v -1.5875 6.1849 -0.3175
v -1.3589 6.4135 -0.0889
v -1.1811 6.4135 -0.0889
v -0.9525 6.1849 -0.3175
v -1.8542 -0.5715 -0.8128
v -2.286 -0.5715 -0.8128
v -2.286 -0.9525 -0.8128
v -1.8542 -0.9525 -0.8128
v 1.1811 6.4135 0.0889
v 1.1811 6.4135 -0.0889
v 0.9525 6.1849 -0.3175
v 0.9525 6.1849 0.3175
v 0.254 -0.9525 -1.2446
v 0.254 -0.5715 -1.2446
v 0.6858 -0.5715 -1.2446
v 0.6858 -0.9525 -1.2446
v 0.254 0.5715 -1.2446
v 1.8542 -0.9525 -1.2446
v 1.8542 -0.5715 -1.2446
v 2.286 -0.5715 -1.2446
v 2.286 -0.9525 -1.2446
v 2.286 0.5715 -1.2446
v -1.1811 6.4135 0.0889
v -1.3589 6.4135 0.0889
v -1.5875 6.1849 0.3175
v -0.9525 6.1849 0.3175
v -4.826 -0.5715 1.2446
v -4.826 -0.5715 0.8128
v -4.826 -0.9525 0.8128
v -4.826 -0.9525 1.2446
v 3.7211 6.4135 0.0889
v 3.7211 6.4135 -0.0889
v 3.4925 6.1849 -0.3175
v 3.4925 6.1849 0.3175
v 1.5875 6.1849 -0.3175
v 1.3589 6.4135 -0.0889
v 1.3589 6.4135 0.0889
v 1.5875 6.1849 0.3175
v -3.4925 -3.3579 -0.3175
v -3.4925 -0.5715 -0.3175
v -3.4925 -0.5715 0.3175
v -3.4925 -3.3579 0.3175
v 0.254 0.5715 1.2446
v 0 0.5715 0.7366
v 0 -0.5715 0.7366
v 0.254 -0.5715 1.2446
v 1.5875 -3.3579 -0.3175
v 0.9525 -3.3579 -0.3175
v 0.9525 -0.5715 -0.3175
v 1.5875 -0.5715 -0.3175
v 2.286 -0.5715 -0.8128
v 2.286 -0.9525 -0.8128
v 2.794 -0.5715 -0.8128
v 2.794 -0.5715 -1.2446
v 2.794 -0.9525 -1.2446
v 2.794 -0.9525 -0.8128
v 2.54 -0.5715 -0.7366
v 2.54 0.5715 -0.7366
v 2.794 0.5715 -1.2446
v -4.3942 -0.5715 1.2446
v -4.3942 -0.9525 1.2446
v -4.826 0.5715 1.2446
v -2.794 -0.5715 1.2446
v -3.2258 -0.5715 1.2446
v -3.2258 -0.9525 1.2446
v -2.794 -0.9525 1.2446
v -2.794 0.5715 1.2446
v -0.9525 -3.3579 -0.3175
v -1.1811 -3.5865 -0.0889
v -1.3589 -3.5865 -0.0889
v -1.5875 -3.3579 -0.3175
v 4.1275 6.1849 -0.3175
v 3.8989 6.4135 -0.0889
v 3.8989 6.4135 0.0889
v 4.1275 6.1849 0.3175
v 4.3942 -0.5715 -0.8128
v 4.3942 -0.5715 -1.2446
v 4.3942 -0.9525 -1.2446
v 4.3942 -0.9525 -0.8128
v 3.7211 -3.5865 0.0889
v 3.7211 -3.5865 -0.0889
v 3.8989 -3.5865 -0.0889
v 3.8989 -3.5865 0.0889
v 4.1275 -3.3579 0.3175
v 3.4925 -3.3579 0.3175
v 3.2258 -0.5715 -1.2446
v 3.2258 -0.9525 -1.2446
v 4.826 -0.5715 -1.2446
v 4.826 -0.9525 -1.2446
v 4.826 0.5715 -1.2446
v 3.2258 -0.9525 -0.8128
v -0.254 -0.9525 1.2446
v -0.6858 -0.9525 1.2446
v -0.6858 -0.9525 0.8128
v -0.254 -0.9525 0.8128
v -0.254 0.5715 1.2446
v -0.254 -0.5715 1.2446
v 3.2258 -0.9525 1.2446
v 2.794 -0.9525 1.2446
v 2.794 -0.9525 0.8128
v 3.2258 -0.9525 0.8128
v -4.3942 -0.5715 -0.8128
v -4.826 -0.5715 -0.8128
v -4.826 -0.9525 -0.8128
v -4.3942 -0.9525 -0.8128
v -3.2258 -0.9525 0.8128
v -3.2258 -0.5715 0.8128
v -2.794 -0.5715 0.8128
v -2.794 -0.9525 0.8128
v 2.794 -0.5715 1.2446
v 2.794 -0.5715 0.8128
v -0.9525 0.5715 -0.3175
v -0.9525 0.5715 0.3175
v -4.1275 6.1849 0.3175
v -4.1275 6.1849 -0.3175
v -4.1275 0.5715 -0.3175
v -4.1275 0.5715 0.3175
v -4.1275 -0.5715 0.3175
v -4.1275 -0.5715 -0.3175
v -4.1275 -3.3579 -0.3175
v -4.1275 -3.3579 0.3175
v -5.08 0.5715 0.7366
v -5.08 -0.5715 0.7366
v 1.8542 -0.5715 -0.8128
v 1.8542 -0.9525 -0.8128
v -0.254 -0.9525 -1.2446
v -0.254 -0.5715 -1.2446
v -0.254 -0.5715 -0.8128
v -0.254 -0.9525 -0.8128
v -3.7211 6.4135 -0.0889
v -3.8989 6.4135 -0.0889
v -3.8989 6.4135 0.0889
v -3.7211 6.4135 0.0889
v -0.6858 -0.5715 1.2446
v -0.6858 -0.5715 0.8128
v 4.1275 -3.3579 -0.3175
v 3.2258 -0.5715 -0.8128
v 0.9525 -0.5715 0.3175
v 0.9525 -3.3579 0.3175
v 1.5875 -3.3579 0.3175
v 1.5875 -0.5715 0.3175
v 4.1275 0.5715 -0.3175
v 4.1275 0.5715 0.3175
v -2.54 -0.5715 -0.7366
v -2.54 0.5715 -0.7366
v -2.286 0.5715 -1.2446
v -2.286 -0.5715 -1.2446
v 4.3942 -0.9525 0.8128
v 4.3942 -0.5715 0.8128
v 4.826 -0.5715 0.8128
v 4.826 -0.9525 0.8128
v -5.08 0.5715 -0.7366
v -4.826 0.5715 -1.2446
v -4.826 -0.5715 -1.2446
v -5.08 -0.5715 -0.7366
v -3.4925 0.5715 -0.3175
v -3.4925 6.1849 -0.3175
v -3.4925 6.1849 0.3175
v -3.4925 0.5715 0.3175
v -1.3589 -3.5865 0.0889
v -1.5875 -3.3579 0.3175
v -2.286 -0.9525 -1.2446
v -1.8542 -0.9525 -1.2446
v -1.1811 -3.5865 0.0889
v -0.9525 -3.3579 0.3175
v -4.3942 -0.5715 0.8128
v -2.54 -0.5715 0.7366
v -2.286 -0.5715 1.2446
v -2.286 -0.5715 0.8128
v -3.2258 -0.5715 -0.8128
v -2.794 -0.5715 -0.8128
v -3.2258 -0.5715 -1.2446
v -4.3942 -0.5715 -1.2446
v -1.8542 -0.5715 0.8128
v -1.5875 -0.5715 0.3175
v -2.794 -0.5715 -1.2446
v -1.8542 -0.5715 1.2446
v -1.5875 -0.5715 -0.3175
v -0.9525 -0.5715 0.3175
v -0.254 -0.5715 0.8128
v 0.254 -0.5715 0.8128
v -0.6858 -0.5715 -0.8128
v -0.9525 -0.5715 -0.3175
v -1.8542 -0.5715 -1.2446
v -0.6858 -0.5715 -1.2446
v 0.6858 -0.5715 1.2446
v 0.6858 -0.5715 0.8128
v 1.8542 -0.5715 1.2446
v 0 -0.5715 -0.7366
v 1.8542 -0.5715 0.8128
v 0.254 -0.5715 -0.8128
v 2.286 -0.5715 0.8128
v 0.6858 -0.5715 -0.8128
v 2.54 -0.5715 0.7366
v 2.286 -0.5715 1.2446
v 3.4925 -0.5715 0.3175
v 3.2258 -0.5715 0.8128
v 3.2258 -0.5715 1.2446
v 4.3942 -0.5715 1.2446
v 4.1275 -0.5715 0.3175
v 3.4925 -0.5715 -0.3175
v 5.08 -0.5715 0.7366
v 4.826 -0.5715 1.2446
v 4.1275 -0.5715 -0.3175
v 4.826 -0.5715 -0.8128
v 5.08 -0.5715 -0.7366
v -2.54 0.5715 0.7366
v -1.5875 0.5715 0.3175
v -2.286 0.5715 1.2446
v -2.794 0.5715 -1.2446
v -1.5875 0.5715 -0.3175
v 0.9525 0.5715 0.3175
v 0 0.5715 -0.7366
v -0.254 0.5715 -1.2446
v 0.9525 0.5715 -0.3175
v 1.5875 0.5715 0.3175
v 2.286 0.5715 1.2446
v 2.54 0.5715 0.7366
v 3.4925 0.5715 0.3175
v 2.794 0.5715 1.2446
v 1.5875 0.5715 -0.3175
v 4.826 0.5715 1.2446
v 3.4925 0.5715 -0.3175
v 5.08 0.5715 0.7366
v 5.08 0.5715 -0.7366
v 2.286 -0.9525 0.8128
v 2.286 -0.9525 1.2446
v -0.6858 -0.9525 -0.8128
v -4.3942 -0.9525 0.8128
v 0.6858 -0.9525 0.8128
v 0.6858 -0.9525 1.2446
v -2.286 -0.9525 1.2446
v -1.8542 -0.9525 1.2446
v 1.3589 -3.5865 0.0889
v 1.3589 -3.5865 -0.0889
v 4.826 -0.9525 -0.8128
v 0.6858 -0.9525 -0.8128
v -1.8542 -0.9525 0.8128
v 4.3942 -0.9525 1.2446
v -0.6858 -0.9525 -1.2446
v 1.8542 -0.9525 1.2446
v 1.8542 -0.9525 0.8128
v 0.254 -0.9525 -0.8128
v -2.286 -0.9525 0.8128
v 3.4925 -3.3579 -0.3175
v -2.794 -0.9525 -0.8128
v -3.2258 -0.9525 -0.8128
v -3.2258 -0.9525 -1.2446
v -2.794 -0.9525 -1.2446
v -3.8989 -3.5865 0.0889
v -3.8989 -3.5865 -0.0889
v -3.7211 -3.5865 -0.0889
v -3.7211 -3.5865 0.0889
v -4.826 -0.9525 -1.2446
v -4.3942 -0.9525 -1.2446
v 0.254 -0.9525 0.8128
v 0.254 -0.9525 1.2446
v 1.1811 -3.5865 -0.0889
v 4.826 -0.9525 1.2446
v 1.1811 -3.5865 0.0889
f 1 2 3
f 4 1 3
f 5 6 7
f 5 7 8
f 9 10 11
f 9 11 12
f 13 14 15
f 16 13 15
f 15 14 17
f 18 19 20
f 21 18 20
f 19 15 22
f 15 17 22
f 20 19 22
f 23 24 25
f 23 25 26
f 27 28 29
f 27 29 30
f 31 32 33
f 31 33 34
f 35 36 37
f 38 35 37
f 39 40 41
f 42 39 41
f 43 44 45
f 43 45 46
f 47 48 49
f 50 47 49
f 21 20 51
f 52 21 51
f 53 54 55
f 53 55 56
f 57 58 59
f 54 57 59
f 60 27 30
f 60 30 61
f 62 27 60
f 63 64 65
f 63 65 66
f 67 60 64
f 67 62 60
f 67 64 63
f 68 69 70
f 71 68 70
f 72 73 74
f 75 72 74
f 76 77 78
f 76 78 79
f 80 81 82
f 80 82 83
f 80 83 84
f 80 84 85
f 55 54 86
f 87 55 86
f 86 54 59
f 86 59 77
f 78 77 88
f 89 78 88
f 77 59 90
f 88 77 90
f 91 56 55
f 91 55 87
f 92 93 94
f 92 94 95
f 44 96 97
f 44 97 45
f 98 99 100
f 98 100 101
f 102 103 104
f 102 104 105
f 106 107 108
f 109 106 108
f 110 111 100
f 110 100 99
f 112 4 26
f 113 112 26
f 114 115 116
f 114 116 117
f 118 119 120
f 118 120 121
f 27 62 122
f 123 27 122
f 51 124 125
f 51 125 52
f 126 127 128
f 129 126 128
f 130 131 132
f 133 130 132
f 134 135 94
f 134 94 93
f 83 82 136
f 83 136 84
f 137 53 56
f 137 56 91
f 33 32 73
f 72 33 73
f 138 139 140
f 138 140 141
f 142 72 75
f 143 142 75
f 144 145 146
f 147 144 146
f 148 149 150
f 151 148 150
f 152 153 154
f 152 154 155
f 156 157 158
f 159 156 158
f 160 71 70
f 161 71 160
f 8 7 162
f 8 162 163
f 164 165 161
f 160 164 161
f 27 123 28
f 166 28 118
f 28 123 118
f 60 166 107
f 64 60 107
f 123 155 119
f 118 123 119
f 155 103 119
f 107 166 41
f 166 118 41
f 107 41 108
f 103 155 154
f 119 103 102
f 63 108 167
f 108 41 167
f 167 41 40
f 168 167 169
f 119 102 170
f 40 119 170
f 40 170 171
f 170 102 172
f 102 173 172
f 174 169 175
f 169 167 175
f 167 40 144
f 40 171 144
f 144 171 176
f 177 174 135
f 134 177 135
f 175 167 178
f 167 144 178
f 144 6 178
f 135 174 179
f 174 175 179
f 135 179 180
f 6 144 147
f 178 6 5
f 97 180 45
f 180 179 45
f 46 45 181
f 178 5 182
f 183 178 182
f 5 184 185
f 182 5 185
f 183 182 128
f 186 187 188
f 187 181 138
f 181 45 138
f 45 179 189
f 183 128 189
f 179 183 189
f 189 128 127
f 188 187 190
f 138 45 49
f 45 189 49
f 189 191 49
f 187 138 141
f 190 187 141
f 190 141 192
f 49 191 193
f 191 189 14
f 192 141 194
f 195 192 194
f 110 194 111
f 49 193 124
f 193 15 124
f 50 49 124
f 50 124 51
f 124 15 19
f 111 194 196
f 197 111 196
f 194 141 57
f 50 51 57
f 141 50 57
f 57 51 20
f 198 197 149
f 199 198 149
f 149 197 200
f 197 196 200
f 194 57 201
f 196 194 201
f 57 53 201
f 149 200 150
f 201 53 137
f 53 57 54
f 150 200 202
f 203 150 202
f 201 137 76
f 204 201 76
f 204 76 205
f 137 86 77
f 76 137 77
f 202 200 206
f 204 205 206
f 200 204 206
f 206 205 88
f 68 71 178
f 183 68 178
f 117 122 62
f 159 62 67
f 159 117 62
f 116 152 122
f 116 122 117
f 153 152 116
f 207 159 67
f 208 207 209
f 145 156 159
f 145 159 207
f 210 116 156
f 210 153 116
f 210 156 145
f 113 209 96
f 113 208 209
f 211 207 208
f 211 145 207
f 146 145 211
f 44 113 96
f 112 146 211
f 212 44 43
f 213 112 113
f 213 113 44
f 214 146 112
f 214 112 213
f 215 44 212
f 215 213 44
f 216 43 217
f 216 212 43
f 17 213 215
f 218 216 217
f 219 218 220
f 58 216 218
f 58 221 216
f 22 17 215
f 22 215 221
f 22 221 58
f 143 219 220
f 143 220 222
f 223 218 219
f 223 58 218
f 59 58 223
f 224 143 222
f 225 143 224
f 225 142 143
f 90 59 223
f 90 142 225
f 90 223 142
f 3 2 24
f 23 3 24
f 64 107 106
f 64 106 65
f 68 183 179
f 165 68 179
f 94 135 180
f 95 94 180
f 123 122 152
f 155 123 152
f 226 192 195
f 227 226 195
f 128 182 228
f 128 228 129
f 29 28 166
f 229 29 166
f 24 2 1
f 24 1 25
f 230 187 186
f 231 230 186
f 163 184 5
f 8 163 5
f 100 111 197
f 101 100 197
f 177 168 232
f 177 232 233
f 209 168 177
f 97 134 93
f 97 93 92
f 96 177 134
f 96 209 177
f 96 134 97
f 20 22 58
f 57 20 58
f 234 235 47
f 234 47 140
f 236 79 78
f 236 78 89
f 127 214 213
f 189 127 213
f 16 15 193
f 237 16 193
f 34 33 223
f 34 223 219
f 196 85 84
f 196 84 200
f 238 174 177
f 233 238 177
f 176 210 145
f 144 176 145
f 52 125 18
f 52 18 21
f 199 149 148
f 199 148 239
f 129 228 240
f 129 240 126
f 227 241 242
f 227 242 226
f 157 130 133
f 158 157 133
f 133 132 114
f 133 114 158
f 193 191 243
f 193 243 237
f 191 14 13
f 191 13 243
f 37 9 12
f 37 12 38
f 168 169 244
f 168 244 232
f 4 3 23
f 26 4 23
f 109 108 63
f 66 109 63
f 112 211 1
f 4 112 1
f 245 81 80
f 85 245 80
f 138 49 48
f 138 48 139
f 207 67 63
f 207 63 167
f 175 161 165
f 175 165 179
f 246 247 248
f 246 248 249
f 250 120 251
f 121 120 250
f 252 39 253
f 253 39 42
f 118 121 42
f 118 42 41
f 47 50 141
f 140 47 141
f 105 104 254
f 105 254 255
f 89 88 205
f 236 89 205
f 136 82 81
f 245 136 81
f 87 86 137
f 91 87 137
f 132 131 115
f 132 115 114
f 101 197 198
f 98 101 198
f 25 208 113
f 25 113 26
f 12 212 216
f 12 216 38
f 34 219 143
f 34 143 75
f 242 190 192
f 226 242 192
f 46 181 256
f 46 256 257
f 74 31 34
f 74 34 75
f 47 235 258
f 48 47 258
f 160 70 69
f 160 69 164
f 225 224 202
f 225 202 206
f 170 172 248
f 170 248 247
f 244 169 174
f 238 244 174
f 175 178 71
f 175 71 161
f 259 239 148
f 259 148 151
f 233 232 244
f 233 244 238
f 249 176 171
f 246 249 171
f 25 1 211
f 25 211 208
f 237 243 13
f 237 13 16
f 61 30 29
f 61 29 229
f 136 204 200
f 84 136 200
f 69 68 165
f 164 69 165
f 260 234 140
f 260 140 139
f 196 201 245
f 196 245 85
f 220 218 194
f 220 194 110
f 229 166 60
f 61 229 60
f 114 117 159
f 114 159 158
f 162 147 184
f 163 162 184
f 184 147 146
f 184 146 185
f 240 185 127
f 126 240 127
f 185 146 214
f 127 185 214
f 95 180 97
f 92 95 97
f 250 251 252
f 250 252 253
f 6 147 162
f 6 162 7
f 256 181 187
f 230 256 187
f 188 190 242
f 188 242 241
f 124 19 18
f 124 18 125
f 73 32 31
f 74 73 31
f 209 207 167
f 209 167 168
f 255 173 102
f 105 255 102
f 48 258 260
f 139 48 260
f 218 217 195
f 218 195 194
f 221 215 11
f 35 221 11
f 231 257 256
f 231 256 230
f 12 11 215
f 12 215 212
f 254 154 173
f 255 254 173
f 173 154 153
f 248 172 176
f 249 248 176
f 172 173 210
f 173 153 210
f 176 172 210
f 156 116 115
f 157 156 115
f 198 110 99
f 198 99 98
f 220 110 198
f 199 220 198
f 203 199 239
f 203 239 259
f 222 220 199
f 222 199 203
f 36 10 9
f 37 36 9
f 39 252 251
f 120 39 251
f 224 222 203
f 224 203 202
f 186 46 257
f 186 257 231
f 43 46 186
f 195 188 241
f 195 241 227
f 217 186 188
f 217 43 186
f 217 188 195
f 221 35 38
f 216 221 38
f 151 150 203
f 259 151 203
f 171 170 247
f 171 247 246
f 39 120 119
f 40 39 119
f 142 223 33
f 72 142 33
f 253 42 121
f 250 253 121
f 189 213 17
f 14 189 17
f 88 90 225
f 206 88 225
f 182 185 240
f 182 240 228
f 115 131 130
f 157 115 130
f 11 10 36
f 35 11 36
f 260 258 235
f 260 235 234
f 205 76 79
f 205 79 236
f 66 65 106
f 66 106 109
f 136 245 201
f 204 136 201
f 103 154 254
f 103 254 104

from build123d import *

# Parameters (mm, degrees)
SKETCH1_W                        = 10.16
SKETCH1_H                        = 2.4892
BASE_EXTRUDE_DEPTH               = 0.5715
SNAP_GROOVES_DEPTH               = 2.143
SKETCH4_W                        = 0.4318
SKETCH4_H                        = 0.4318
STANDOFFS_DEPTH                  = 0.381
POSITION_PATTERN_COUNT           = 4
POSITION_PATTERN_PITCH           = 2.54
SKETCH5_W                        = 0.635
SKETCH5_H                        = 10
TERMINAL_TH_DEPTH                = 0.3175
T1_TIP1_SIZE                     = 0.2286
TERMINAL_PATTERN_COUNT           = 4
TERMINAL_PATTERN_PITCH           = 2.54
T1_TIP1_OF_TERMINAL_PATTERN_SIZE = 0.2286


with BuildPart() as part:
    # Sketch1 → Base-Extrude (new body, symmetric)
    with BuildSketch(Plane(origin=(0, 0, 0), x_dir=(1, 0, 0), z_dir=(0, 1, 0))):
        Rectangle(SKETCH1_W, SKETCH1_H)
    extrude(amount=BASE_EXTRUDE_DEPTH, both=True)

    # Sketch3 → Snap Grooves (cut, through all)
    with BuildSketch(Plane(origin=(0, 0.5715, 0), x_dir=(-1, 0, 0), z_dir=(0, 1, 0))):
        Polygon((2.286, 1.2446), (2.794, 1.2446), (2.54, 0.7366), align=None)
        Polygon((2.286, -1.2446), (2.794, -1.2446), (2.54, -0.7366), align=None)
        Polygon((5.08, -0.7366), (5.334, -1.2446), (4.826, -1.2446), align=None)
        Polygon((5.08, 0.7366), (5.334, 1.2446), (4.826, 1.2446), align=None)
    snap_grooves = extrude(amount=-SNAP_GROOVES_DEPTH, mode=Mode.SUBTRACT)

    # Sketch4 → Standoffs (add)
    with BuildSketch(Plane.XZ.offset(0.5715)):
        with Locations((-4.6101, 1.0287)):
            Rectangle(SKETCH4_W, SKETCH4_H)
        with Locations((-3.0099, 1.0287)):
            Rectangle(SKETCH4_W, SKETCH4_H)
        with Locations((-3.0099, -1.0287)):
            Rectangle(SKETCH4_W, SKETCH4_H)
        with Locations((-4.6101, -1.0287)):
            Rectangle(SKETCH4_W, SKETCH4_H)
    standoffs = extrude(amount=STANDOFFS_DEPTH)

    # Position Pattern: Snap Grooves, Standoffs ×4
    with Locations(*[(i * POSITION_PATTERN_PITCH, 0, 0) for i in range(1, POSITION_PATTERN_COUNT)]):
        add(snap_grooves, mode=Mode.SUBTRACT)
        add(standoffs)

    # Sketch5 → Terminal -TH (add, symmetric)
    with BuildSketch(Plane.ZY.offset(3.81)):
        with Locations((0, 1.4135)):
            Rectangle(SKETCH5_W, SKETCH5_H)
    terminal_th = extrude(amount=TERMINAL_TH_DEPTH, both=True)

    # T1 Tip1
    t1_tip1_edges = [part.edges().sort_by_distance(p)[0] for p in [
        (-3.81, -3.5865, 0.3175),
        (-4.1275, -3.5865, 0),
        (-3.81, 6.4135, -0.3175),
        (-3.4925, -3.5865, 0),
        (-3.81, -3.5865, -0.3175),
        (-3.4925, 6.4135, 0),
        (-3.81, 6.4135, 0.3175),
        (-4.1275, 6.4135, 0),
    ]]
    chamfer(t1_tip1_edges, length=T1_TIP1_SIZE)

    # Terminal Pattern: Terminal -TH ×4
    with Locations(*[(i * TERMINAL_PATTERN_PITCH, 0, 0) for i in range(1, TERMINAL_PATTERN_COUNT)]):
        add(terminal_th)

    # T1 Tip1 of Terminal Pattern
    t1_tip1_of_terminal_pattern_edges = [part.edges().sort_by_distance(p)[0] for p in [
        (-1.27, -3.5865, 0.3175),
        (-1.5875, -3.5865, 0),
        (-1.27, 6.4135, -0.3175),
        (-0.9525, -3.5865, 0),
        (-1.27, -3.5865, -0.3175),
        (-0.9525, 6.4135, 0),
        (-1.27, 6.4135, 0.3175),
        (-1.5875, 6.4135, 0),
        (1.27, -3.5865, 0.3175),
        (0.9525, -3.5865, 0),
        (1.27, 6.4135, -0.3175),
        (1.5875, -3.5865, 0),
        (1.27, -3.5865, -0.3175),
        (1.5875, 6.4135, 0),
        (1.27, 6.4135, 0.3175),
        (0.9525, 6.4135, 0),
        (3.81, -3.5865, 0.3175),
        (3.4925, -3.5865, 0),
        (3.81, 6.4135, -0.3175),
        (4.1275, -3.5865, 0),
        (3.81, -3.5865, -0.3175),
        (4.1275, 6.4135, 0),
        (3.81, 6.4135, 0.3175),
        (3.4925, 6.4135, 0),
    ]]
    chamfer(t1_tip1_of_terminal_pattern_edges, length=T1_TIP1_OF_TERMINAL_PATTERN_SIZE)


solid = part.part
